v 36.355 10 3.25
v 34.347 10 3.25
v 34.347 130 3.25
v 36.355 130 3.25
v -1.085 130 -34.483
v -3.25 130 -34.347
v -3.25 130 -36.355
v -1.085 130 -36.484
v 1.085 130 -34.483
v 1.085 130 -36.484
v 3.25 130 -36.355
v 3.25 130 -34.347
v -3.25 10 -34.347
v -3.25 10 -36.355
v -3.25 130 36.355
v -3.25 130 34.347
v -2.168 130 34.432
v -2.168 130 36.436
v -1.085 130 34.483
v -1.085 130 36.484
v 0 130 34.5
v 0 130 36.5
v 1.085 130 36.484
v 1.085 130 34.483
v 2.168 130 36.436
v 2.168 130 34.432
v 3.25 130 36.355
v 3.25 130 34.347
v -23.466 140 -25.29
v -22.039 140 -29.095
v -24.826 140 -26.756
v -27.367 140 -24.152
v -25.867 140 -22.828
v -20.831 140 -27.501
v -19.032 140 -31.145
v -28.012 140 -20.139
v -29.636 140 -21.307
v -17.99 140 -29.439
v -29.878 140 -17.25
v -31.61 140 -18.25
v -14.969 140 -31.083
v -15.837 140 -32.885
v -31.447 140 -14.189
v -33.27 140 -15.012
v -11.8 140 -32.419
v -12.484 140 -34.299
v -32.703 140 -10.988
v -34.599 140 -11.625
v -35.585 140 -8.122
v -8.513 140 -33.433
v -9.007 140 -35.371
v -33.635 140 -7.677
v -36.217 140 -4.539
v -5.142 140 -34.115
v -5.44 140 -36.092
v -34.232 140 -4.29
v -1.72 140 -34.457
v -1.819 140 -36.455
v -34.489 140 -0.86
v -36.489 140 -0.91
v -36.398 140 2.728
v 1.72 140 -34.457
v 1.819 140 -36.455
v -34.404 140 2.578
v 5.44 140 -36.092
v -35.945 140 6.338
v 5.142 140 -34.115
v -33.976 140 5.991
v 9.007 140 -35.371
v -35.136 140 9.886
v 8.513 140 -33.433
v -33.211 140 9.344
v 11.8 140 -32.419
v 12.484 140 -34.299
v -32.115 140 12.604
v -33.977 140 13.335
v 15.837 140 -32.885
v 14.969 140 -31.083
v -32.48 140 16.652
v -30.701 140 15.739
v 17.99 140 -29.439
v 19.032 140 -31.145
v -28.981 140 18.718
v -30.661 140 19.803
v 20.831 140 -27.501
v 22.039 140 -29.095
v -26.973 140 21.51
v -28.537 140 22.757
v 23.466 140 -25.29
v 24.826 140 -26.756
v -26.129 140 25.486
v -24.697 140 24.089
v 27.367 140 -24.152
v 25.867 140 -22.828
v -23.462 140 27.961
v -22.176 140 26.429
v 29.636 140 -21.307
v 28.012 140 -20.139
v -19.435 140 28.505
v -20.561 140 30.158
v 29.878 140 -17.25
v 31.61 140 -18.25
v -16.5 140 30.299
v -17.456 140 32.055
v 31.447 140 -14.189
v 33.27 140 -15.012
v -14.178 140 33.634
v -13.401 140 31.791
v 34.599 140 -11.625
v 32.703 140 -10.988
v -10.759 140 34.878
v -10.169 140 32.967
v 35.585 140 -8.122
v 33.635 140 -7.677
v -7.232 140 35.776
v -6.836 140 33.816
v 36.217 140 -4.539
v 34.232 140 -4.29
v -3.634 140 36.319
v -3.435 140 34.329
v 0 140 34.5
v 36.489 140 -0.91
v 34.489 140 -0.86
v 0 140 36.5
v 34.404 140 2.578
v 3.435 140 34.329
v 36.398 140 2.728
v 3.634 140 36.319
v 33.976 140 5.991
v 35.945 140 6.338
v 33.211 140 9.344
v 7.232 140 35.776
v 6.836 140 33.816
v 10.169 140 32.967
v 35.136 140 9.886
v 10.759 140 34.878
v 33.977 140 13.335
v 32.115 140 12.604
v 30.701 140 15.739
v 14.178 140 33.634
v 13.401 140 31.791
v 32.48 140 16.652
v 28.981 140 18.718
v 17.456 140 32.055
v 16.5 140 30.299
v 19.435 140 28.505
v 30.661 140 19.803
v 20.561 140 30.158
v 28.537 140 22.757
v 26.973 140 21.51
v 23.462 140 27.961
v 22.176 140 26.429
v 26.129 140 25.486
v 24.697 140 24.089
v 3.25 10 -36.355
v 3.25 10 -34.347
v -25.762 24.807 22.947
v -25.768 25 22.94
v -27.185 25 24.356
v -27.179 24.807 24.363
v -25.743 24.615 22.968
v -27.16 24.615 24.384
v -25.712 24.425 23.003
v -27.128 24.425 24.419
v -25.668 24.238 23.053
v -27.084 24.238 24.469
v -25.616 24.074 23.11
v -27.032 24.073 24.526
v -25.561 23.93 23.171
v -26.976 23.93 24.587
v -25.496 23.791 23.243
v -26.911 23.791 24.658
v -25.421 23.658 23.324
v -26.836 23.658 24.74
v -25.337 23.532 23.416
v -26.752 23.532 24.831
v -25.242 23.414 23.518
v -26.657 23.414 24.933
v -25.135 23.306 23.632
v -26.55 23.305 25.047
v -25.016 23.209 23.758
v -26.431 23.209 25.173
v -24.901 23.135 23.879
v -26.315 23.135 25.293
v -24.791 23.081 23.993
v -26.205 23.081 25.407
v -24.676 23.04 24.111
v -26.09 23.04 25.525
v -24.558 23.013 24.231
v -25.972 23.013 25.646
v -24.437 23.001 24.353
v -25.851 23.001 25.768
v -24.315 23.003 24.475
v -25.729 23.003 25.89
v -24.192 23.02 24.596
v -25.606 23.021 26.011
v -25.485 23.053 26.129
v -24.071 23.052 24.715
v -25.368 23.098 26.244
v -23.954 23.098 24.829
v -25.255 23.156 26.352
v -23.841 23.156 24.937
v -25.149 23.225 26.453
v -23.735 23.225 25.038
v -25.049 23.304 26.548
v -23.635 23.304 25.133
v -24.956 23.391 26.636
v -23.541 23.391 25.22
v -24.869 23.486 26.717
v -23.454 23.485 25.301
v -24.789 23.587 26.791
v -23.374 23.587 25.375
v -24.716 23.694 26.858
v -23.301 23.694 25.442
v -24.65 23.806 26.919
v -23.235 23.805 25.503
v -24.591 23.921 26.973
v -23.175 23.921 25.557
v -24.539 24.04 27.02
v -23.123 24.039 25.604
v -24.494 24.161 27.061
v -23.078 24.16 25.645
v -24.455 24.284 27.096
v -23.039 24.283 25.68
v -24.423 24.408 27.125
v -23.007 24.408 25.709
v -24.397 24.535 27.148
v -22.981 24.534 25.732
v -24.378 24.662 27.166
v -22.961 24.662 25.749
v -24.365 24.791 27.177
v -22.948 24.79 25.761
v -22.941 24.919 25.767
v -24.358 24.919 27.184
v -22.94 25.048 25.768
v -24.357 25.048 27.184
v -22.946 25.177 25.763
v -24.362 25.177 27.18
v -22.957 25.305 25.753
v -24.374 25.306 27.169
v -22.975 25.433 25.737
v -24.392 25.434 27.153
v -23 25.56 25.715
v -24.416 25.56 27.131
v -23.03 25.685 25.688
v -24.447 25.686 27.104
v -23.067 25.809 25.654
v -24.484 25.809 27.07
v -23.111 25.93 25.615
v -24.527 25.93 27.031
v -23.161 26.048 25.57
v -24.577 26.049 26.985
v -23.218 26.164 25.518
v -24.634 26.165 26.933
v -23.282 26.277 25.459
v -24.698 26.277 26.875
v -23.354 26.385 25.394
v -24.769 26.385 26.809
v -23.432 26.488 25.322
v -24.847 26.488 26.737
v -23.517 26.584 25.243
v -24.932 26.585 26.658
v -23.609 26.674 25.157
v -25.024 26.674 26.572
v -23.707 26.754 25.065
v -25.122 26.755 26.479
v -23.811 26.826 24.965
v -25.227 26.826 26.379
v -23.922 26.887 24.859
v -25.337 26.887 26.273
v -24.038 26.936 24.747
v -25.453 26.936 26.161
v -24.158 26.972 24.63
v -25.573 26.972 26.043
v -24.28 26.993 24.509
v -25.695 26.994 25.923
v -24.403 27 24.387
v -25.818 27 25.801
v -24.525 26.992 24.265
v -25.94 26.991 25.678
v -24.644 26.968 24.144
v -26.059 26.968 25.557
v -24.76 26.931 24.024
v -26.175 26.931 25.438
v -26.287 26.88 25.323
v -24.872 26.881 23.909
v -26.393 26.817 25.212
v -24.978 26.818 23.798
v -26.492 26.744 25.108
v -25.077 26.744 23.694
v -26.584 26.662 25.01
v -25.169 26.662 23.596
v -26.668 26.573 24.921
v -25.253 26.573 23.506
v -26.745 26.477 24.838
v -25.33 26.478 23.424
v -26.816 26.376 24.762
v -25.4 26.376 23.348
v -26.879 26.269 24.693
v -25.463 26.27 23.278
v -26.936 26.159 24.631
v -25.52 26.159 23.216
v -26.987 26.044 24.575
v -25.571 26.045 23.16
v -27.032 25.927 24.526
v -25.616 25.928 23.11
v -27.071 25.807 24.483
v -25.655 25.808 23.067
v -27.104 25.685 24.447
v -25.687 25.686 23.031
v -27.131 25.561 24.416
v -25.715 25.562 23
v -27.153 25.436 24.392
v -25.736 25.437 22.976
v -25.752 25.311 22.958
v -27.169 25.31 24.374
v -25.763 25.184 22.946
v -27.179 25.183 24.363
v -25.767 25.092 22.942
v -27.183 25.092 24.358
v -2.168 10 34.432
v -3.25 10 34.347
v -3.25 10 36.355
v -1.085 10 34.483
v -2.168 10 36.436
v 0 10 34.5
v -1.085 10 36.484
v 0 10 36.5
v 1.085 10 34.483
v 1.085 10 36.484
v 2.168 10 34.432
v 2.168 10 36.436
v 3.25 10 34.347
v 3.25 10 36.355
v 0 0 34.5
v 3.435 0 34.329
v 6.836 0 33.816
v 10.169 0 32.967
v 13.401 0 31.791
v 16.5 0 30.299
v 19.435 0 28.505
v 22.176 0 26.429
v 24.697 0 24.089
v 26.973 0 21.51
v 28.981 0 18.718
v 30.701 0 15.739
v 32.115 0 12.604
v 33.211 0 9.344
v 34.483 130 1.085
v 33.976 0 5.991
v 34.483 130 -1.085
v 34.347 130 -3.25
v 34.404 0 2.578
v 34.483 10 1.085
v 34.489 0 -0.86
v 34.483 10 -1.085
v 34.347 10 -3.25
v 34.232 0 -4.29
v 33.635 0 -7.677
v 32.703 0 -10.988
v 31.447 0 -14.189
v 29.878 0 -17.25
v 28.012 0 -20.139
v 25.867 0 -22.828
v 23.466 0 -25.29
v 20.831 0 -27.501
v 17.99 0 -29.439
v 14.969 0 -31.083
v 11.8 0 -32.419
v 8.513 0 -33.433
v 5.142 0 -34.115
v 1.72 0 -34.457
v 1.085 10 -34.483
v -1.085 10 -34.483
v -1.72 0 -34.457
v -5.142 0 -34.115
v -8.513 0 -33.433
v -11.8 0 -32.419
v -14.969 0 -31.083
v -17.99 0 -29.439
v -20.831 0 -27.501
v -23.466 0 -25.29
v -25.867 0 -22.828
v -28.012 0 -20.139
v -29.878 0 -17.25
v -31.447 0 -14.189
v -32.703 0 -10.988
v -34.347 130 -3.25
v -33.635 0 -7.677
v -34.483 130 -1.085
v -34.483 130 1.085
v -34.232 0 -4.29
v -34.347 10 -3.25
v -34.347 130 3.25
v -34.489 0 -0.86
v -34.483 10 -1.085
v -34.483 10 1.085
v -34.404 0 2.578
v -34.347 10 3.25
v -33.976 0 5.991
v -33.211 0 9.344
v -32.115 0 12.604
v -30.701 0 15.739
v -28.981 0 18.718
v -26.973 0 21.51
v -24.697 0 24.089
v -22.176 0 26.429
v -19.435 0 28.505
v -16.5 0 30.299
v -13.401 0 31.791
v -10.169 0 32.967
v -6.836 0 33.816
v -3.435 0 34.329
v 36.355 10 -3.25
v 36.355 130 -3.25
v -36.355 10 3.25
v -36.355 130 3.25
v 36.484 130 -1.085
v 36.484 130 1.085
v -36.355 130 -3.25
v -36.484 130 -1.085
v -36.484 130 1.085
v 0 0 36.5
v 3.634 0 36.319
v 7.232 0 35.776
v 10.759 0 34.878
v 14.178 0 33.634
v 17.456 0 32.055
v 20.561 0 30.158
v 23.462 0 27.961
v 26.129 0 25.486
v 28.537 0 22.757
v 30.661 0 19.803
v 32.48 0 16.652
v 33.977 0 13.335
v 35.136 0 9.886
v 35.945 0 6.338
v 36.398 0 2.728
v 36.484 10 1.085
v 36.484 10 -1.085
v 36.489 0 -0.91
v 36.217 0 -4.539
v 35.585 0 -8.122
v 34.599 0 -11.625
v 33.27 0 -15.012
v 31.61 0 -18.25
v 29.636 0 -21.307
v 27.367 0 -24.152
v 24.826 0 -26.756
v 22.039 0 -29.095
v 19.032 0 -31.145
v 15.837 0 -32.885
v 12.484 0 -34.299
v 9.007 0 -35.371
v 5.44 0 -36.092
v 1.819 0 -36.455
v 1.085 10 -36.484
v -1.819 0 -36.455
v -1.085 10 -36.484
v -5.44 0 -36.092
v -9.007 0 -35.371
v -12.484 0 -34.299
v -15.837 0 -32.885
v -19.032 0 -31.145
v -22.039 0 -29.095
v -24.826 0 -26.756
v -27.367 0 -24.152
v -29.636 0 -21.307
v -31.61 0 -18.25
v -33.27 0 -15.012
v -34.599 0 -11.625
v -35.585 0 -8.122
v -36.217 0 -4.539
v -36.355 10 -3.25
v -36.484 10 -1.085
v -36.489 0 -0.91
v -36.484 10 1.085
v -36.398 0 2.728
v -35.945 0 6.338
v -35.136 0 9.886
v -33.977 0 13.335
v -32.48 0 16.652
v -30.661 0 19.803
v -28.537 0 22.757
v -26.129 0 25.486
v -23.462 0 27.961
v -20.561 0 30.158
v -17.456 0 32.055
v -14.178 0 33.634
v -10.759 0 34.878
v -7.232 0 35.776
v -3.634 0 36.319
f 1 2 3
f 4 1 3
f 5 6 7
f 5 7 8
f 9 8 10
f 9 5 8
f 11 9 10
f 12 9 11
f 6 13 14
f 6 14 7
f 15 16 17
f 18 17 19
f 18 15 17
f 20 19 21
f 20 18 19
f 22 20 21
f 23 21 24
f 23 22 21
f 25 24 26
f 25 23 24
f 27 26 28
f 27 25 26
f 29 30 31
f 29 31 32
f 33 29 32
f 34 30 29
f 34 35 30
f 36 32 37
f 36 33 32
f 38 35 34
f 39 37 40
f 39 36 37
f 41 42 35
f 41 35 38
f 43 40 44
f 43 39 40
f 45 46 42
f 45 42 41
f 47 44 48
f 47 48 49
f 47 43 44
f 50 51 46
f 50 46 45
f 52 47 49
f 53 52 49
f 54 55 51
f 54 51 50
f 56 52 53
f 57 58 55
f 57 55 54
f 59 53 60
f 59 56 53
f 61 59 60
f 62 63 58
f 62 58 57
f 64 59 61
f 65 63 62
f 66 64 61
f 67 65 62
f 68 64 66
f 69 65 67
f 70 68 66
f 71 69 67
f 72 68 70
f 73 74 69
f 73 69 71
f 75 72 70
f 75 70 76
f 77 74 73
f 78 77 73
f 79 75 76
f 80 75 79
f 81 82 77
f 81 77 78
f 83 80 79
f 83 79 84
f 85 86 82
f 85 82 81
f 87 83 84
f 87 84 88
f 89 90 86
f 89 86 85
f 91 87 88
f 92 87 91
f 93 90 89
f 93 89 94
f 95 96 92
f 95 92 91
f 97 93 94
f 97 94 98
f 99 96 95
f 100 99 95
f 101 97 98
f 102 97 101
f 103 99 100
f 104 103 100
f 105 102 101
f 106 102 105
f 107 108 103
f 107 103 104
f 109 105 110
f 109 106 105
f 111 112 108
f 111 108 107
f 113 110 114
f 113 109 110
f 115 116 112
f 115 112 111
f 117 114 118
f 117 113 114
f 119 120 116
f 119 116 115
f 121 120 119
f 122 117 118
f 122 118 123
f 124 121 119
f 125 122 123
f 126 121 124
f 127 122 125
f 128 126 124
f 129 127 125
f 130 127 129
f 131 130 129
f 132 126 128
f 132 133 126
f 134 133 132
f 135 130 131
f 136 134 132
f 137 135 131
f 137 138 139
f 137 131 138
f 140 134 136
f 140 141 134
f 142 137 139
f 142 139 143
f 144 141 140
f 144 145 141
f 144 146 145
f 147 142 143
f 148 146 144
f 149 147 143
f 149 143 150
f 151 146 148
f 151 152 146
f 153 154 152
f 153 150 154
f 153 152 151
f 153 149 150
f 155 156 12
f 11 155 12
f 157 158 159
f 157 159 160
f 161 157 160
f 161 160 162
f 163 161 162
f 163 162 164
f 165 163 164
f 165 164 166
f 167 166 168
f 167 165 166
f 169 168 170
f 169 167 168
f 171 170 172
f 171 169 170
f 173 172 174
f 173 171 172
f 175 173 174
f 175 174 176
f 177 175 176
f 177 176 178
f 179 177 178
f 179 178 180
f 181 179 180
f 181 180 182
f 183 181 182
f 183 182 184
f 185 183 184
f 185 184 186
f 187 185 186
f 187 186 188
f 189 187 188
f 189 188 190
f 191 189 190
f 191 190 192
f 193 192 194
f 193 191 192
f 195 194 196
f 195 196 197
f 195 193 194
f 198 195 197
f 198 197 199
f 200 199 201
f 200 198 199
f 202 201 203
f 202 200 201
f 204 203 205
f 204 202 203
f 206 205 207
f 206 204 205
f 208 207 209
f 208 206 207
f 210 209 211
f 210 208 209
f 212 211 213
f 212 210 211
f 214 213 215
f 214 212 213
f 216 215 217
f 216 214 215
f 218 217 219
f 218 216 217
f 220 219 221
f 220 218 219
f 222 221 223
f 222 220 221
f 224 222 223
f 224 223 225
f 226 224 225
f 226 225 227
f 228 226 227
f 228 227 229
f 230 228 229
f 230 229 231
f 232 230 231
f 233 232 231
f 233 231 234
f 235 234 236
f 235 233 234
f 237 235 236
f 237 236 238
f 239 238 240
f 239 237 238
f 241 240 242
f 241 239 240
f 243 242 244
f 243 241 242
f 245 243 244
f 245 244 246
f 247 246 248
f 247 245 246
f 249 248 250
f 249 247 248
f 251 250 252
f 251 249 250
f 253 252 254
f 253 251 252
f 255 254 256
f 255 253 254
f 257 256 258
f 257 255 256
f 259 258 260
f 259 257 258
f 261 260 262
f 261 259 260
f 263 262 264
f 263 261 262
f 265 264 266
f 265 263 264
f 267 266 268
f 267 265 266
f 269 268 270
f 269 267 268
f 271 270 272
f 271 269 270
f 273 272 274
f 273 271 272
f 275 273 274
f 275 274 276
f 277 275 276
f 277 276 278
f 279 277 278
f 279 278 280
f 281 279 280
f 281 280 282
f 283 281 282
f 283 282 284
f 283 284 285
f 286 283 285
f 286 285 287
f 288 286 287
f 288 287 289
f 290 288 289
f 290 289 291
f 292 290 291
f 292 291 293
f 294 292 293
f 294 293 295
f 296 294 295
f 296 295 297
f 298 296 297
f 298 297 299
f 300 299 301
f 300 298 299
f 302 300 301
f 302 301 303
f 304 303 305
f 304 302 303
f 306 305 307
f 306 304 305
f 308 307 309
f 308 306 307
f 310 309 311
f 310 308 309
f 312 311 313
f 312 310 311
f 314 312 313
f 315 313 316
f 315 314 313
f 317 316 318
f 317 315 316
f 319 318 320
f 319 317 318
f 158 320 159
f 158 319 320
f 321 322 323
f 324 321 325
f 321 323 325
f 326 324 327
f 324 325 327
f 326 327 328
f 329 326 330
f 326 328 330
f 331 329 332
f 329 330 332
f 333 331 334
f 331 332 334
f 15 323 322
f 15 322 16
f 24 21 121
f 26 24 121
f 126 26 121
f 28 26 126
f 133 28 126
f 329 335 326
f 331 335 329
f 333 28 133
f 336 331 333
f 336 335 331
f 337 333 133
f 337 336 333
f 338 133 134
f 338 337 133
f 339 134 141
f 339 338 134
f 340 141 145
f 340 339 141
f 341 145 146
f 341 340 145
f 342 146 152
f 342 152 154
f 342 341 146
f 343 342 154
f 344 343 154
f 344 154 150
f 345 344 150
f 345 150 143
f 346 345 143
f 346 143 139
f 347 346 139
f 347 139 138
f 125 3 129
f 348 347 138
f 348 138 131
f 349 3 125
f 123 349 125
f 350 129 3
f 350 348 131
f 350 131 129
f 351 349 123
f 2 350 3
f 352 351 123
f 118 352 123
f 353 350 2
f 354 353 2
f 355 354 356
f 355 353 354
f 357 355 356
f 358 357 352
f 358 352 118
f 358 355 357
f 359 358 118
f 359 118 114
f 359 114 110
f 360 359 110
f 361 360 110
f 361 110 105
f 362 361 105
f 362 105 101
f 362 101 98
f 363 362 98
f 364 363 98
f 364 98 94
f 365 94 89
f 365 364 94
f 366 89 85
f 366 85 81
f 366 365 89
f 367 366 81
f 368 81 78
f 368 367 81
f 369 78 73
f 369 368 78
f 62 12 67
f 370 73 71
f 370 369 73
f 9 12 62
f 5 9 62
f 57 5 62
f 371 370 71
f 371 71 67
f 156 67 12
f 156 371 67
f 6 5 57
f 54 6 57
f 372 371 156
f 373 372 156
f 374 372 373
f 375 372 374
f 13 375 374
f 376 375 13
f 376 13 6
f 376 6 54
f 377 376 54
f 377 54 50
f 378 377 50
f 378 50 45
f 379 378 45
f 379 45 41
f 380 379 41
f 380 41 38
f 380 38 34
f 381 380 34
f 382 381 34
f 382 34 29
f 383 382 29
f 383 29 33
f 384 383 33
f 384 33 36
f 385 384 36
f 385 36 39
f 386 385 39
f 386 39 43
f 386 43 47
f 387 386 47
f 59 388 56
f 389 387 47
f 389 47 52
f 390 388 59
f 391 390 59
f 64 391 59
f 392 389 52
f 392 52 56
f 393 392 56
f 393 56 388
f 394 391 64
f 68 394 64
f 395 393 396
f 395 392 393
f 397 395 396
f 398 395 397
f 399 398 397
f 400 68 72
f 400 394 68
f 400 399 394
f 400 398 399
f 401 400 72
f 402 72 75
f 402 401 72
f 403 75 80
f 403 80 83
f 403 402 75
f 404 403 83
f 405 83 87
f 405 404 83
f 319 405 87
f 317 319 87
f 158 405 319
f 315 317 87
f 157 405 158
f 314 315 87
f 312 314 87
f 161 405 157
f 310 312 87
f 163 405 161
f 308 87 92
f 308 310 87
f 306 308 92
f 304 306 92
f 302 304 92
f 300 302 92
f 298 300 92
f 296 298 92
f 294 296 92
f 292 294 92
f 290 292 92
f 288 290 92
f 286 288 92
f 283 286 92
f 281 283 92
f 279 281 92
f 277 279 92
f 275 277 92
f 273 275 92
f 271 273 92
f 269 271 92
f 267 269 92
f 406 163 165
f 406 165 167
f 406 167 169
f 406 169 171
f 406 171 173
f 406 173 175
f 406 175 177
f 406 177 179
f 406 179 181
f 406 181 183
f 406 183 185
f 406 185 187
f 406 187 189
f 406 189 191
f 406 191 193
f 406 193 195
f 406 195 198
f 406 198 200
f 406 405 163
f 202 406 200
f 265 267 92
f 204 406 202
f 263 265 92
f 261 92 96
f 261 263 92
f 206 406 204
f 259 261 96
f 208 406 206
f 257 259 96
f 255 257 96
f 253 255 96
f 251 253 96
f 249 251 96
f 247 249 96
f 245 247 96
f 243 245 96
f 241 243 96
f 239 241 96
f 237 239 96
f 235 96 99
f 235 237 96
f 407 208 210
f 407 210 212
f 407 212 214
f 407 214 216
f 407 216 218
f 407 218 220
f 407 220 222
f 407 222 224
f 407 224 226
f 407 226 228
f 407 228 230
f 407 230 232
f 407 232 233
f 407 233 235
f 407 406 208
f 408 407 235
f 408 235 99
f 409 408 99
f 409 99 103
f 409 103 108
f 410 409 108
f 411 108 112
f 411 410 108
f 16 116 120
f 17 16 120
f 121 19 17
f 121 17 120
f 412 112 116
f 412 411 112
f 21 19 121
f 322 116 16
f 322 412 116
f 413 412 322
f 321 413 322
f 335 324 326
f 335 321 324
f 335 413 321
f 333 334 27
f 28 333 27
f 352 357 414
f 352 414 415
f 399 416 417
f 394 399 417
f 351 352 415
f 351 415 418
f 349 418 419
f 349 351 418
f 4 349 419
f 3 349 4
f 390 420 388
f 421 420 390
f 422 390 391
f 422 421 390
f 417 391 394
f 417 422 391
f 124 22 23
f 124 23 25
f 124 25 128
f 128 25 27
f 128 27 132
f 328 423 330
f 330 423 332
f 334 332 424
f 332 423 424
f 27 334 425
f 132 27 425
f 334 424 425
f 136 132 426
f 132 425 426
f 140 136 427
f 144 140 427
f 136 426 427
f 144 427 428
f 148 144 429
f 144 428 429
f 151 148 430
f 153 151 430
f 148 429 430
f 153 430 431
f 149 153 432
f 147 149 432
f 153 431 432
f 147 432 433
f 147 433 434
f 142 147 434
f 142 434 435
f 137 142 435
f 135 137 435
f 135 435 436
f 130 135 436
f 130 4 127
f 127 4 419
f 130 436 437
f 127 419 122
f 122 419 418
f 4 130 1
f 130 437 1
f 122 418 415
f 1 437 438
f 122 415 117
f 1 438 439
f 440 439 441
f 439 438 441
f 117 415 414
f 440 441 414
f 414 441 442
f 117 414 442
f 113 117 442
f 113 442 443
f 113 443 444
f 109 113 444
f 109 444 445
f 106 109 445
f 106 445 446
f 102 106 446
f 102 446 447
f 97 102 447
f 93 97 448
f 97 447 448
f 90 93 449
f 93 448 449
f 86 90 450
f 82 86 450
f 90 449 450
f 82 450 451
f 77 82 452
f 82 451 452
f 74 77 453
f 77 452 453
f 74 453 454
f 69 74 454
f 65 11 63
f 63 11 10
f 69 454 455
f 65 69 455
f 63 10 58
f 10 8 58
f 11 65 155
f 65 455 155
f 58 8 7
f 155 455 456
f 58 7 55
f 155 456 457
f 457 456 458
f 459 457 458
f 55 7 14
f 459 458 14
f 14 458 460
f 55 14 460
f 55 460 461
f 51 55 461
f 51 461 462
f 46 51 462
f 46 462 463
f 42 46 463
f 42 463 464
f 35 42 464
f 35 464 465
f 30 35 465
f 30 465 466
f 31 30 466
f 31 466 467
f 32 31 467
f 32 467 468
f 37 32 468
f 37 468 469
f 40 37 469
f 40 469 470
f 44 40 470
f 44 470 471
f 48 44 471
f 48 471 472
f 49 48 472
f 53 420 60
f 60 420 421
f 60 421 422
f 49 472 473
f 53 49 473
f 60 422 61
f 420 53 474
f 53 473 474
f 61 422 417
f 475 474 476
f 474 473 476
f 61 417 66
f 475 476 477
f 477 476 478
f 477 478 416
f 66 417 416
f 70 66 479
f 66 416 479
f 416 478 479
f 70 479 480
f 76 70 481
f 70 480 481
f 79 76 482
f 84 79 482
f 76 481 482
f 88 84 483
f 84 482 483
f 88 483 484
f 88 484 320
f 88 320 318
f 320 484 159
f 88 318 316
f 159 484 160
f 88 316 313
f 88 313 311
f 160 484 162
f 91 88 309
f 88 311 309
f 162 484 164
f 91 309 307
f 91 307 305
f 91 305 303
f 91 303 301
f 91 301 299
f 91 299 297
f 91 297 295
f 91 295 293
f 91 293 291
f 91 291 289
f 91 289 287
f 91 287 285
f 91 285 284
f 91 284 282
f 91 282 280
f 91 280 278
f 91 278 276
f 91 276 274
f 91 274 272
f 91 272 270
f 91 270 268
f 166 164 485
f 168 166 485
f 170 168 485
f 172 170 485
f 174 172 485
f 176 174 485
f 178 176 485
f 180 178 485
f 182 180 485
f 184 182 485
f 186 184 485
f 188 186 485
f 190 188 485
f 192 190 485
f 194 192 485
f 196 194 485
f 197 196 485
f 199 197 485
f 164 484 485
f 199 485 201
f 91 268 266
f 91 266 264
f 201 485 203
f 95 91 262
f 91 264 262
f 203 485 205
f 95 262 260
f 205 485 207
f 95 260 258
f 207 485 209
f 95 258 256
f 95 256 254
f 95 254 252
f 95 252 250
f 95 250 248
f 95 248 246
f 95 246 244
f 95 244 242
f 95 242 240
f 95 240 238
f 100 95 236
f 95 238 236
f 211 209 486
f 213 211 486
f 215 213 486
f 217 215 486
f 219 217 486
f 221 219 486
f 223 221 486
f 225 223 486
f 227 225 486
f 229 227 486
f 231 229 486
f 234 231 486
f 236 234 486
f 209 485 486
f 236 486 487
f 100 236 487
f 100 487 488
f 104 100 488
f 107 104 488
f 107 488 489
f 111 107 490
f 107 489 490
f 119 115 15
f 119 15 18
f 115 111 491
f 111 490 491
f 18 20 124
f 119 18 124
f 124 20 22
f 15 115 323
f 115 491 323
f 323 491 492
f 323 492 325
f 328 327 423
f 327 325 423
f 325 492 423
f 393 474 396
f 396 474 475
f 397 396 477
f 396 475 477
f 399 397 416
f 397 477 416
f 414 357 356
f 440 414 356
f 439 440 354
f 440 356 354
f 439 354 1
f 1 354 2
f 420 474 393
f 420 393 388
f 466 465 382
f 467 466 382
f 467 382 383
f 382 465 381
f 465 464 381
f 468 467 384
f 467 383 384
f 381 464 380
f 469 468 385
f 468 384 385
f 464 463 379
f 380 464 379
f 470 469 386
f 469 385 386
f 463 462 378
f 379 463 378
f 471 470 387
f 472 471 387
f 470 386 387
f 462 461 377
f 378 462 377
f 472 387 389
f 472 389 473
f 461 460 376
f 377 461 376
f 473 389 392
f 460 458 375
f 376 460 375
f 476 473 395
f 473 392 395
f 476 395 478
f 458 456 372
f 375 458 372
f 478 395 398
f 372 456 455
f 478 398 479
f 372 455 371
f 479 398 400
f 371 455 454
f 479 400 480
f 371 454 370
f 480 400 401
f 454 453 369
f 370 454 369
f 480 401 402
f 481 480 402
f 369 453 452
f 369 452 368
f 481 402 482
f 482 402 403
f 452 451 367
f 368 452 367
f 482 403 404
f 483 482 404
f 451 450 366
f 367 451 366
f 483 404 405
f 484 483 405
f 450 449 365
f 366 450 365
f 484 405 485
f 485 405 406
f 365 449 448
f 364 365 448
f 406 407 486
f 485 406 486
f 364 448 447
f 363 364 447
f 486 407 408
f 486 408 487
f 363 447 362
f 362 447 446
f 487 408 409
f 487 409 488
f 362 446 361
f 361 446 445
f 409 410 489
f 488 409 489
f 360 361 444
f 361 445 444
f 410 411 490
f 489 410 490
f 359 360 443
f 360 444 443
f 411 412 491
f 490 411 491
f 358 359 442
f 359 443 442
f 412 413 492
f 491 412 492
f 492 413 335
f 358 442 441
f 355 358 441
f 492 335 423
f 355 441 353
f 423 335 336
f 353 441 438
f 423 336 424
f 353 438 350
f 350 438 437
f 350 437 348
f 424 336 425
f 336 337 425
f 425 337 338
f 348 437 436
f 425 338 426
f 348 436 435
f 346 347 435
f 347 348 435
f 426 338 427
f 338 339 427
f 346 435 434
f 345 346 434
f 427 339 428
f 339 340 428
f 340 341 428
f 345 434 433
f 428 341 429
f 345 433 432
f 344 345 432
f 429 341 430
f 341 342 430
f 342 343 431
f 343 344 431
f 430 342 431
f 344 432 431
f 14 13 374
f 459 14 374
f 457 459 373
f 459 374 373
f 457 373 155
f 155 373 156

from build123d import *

# Parameters (mm, degrees)
SKETCH1_R           = 36.5
SKETCH1_R_2         = 34.5
BOSS_EXTRUDE1_DEPTH = 140
SKETCH3_W           = 6.5
SKETCH3_H           = 120
CUT_EXTRUDE1_DEPTH  = 150.212935096
CIRPATTERN1_COUNT   = 2
CIRPATTERN1_ANGLE   = 90
SKETCH4_R           = 2
CUT_EXTRUDE2_DEPTH  = 150.212935096


with BuildPart() as part:
    # Sketch1 → Boss-Extrude1 (new body)
    with BuildSketch(Plane(origin=(0, 0, 0), x_dir=(1, 0, 0), z_dir=(0, 1, 0))):
        Circle(SKETCH1_R)
        Circle(SKETCH1_R_2, mode=Mode.SUBTRACT)
    extrude(amount=BOSS_EXTRUDE1_DEPTH)

    # Sketch3 → Cut-Extrude1 (cut, symmetric)
    with BuildSketch(Plane.XY):
        with Locations((0, 70)):
            Rectangle(SKETCH3_W, SKETCH3_H)
    cut_extrude1 = extrude(amount=CUT_EXTRUDE1_DEPTH, both=True, mode=Mode.SUBTRACT)

    # CirPattern1: Cut-Extrude1 ×2 about axis
    cirpattern1_axis = Axis((0, 125, 0), (0, -1, 0))
    for i in range(1, CIRPATTERN1_COUNT):
        add(cut_extrude1.rotate(cirpattern1_axis, i * CIRPATTERN1_ANGLE / (CIRPATTERN1_COUNT - 1)), mode=Mode.SUBTRACT)

    # Sketch4 → Cut-Extrude2 (cut, through all)
    with BuildSketch(Plane(origin=(0, 0, 0), x_dir=(0.7071067811865477, 0, 0.7071067811865475), z_dir=(-0.7071067811865475, 0, 0.7071067811865477))):
        with Locations((0, 25)):
            Circle(SKETCH4_R)
    extrude(amount=CUT_EXTRUDE2_DEPTH, mode=Mode.SUBTRACT)


solid = part.part
